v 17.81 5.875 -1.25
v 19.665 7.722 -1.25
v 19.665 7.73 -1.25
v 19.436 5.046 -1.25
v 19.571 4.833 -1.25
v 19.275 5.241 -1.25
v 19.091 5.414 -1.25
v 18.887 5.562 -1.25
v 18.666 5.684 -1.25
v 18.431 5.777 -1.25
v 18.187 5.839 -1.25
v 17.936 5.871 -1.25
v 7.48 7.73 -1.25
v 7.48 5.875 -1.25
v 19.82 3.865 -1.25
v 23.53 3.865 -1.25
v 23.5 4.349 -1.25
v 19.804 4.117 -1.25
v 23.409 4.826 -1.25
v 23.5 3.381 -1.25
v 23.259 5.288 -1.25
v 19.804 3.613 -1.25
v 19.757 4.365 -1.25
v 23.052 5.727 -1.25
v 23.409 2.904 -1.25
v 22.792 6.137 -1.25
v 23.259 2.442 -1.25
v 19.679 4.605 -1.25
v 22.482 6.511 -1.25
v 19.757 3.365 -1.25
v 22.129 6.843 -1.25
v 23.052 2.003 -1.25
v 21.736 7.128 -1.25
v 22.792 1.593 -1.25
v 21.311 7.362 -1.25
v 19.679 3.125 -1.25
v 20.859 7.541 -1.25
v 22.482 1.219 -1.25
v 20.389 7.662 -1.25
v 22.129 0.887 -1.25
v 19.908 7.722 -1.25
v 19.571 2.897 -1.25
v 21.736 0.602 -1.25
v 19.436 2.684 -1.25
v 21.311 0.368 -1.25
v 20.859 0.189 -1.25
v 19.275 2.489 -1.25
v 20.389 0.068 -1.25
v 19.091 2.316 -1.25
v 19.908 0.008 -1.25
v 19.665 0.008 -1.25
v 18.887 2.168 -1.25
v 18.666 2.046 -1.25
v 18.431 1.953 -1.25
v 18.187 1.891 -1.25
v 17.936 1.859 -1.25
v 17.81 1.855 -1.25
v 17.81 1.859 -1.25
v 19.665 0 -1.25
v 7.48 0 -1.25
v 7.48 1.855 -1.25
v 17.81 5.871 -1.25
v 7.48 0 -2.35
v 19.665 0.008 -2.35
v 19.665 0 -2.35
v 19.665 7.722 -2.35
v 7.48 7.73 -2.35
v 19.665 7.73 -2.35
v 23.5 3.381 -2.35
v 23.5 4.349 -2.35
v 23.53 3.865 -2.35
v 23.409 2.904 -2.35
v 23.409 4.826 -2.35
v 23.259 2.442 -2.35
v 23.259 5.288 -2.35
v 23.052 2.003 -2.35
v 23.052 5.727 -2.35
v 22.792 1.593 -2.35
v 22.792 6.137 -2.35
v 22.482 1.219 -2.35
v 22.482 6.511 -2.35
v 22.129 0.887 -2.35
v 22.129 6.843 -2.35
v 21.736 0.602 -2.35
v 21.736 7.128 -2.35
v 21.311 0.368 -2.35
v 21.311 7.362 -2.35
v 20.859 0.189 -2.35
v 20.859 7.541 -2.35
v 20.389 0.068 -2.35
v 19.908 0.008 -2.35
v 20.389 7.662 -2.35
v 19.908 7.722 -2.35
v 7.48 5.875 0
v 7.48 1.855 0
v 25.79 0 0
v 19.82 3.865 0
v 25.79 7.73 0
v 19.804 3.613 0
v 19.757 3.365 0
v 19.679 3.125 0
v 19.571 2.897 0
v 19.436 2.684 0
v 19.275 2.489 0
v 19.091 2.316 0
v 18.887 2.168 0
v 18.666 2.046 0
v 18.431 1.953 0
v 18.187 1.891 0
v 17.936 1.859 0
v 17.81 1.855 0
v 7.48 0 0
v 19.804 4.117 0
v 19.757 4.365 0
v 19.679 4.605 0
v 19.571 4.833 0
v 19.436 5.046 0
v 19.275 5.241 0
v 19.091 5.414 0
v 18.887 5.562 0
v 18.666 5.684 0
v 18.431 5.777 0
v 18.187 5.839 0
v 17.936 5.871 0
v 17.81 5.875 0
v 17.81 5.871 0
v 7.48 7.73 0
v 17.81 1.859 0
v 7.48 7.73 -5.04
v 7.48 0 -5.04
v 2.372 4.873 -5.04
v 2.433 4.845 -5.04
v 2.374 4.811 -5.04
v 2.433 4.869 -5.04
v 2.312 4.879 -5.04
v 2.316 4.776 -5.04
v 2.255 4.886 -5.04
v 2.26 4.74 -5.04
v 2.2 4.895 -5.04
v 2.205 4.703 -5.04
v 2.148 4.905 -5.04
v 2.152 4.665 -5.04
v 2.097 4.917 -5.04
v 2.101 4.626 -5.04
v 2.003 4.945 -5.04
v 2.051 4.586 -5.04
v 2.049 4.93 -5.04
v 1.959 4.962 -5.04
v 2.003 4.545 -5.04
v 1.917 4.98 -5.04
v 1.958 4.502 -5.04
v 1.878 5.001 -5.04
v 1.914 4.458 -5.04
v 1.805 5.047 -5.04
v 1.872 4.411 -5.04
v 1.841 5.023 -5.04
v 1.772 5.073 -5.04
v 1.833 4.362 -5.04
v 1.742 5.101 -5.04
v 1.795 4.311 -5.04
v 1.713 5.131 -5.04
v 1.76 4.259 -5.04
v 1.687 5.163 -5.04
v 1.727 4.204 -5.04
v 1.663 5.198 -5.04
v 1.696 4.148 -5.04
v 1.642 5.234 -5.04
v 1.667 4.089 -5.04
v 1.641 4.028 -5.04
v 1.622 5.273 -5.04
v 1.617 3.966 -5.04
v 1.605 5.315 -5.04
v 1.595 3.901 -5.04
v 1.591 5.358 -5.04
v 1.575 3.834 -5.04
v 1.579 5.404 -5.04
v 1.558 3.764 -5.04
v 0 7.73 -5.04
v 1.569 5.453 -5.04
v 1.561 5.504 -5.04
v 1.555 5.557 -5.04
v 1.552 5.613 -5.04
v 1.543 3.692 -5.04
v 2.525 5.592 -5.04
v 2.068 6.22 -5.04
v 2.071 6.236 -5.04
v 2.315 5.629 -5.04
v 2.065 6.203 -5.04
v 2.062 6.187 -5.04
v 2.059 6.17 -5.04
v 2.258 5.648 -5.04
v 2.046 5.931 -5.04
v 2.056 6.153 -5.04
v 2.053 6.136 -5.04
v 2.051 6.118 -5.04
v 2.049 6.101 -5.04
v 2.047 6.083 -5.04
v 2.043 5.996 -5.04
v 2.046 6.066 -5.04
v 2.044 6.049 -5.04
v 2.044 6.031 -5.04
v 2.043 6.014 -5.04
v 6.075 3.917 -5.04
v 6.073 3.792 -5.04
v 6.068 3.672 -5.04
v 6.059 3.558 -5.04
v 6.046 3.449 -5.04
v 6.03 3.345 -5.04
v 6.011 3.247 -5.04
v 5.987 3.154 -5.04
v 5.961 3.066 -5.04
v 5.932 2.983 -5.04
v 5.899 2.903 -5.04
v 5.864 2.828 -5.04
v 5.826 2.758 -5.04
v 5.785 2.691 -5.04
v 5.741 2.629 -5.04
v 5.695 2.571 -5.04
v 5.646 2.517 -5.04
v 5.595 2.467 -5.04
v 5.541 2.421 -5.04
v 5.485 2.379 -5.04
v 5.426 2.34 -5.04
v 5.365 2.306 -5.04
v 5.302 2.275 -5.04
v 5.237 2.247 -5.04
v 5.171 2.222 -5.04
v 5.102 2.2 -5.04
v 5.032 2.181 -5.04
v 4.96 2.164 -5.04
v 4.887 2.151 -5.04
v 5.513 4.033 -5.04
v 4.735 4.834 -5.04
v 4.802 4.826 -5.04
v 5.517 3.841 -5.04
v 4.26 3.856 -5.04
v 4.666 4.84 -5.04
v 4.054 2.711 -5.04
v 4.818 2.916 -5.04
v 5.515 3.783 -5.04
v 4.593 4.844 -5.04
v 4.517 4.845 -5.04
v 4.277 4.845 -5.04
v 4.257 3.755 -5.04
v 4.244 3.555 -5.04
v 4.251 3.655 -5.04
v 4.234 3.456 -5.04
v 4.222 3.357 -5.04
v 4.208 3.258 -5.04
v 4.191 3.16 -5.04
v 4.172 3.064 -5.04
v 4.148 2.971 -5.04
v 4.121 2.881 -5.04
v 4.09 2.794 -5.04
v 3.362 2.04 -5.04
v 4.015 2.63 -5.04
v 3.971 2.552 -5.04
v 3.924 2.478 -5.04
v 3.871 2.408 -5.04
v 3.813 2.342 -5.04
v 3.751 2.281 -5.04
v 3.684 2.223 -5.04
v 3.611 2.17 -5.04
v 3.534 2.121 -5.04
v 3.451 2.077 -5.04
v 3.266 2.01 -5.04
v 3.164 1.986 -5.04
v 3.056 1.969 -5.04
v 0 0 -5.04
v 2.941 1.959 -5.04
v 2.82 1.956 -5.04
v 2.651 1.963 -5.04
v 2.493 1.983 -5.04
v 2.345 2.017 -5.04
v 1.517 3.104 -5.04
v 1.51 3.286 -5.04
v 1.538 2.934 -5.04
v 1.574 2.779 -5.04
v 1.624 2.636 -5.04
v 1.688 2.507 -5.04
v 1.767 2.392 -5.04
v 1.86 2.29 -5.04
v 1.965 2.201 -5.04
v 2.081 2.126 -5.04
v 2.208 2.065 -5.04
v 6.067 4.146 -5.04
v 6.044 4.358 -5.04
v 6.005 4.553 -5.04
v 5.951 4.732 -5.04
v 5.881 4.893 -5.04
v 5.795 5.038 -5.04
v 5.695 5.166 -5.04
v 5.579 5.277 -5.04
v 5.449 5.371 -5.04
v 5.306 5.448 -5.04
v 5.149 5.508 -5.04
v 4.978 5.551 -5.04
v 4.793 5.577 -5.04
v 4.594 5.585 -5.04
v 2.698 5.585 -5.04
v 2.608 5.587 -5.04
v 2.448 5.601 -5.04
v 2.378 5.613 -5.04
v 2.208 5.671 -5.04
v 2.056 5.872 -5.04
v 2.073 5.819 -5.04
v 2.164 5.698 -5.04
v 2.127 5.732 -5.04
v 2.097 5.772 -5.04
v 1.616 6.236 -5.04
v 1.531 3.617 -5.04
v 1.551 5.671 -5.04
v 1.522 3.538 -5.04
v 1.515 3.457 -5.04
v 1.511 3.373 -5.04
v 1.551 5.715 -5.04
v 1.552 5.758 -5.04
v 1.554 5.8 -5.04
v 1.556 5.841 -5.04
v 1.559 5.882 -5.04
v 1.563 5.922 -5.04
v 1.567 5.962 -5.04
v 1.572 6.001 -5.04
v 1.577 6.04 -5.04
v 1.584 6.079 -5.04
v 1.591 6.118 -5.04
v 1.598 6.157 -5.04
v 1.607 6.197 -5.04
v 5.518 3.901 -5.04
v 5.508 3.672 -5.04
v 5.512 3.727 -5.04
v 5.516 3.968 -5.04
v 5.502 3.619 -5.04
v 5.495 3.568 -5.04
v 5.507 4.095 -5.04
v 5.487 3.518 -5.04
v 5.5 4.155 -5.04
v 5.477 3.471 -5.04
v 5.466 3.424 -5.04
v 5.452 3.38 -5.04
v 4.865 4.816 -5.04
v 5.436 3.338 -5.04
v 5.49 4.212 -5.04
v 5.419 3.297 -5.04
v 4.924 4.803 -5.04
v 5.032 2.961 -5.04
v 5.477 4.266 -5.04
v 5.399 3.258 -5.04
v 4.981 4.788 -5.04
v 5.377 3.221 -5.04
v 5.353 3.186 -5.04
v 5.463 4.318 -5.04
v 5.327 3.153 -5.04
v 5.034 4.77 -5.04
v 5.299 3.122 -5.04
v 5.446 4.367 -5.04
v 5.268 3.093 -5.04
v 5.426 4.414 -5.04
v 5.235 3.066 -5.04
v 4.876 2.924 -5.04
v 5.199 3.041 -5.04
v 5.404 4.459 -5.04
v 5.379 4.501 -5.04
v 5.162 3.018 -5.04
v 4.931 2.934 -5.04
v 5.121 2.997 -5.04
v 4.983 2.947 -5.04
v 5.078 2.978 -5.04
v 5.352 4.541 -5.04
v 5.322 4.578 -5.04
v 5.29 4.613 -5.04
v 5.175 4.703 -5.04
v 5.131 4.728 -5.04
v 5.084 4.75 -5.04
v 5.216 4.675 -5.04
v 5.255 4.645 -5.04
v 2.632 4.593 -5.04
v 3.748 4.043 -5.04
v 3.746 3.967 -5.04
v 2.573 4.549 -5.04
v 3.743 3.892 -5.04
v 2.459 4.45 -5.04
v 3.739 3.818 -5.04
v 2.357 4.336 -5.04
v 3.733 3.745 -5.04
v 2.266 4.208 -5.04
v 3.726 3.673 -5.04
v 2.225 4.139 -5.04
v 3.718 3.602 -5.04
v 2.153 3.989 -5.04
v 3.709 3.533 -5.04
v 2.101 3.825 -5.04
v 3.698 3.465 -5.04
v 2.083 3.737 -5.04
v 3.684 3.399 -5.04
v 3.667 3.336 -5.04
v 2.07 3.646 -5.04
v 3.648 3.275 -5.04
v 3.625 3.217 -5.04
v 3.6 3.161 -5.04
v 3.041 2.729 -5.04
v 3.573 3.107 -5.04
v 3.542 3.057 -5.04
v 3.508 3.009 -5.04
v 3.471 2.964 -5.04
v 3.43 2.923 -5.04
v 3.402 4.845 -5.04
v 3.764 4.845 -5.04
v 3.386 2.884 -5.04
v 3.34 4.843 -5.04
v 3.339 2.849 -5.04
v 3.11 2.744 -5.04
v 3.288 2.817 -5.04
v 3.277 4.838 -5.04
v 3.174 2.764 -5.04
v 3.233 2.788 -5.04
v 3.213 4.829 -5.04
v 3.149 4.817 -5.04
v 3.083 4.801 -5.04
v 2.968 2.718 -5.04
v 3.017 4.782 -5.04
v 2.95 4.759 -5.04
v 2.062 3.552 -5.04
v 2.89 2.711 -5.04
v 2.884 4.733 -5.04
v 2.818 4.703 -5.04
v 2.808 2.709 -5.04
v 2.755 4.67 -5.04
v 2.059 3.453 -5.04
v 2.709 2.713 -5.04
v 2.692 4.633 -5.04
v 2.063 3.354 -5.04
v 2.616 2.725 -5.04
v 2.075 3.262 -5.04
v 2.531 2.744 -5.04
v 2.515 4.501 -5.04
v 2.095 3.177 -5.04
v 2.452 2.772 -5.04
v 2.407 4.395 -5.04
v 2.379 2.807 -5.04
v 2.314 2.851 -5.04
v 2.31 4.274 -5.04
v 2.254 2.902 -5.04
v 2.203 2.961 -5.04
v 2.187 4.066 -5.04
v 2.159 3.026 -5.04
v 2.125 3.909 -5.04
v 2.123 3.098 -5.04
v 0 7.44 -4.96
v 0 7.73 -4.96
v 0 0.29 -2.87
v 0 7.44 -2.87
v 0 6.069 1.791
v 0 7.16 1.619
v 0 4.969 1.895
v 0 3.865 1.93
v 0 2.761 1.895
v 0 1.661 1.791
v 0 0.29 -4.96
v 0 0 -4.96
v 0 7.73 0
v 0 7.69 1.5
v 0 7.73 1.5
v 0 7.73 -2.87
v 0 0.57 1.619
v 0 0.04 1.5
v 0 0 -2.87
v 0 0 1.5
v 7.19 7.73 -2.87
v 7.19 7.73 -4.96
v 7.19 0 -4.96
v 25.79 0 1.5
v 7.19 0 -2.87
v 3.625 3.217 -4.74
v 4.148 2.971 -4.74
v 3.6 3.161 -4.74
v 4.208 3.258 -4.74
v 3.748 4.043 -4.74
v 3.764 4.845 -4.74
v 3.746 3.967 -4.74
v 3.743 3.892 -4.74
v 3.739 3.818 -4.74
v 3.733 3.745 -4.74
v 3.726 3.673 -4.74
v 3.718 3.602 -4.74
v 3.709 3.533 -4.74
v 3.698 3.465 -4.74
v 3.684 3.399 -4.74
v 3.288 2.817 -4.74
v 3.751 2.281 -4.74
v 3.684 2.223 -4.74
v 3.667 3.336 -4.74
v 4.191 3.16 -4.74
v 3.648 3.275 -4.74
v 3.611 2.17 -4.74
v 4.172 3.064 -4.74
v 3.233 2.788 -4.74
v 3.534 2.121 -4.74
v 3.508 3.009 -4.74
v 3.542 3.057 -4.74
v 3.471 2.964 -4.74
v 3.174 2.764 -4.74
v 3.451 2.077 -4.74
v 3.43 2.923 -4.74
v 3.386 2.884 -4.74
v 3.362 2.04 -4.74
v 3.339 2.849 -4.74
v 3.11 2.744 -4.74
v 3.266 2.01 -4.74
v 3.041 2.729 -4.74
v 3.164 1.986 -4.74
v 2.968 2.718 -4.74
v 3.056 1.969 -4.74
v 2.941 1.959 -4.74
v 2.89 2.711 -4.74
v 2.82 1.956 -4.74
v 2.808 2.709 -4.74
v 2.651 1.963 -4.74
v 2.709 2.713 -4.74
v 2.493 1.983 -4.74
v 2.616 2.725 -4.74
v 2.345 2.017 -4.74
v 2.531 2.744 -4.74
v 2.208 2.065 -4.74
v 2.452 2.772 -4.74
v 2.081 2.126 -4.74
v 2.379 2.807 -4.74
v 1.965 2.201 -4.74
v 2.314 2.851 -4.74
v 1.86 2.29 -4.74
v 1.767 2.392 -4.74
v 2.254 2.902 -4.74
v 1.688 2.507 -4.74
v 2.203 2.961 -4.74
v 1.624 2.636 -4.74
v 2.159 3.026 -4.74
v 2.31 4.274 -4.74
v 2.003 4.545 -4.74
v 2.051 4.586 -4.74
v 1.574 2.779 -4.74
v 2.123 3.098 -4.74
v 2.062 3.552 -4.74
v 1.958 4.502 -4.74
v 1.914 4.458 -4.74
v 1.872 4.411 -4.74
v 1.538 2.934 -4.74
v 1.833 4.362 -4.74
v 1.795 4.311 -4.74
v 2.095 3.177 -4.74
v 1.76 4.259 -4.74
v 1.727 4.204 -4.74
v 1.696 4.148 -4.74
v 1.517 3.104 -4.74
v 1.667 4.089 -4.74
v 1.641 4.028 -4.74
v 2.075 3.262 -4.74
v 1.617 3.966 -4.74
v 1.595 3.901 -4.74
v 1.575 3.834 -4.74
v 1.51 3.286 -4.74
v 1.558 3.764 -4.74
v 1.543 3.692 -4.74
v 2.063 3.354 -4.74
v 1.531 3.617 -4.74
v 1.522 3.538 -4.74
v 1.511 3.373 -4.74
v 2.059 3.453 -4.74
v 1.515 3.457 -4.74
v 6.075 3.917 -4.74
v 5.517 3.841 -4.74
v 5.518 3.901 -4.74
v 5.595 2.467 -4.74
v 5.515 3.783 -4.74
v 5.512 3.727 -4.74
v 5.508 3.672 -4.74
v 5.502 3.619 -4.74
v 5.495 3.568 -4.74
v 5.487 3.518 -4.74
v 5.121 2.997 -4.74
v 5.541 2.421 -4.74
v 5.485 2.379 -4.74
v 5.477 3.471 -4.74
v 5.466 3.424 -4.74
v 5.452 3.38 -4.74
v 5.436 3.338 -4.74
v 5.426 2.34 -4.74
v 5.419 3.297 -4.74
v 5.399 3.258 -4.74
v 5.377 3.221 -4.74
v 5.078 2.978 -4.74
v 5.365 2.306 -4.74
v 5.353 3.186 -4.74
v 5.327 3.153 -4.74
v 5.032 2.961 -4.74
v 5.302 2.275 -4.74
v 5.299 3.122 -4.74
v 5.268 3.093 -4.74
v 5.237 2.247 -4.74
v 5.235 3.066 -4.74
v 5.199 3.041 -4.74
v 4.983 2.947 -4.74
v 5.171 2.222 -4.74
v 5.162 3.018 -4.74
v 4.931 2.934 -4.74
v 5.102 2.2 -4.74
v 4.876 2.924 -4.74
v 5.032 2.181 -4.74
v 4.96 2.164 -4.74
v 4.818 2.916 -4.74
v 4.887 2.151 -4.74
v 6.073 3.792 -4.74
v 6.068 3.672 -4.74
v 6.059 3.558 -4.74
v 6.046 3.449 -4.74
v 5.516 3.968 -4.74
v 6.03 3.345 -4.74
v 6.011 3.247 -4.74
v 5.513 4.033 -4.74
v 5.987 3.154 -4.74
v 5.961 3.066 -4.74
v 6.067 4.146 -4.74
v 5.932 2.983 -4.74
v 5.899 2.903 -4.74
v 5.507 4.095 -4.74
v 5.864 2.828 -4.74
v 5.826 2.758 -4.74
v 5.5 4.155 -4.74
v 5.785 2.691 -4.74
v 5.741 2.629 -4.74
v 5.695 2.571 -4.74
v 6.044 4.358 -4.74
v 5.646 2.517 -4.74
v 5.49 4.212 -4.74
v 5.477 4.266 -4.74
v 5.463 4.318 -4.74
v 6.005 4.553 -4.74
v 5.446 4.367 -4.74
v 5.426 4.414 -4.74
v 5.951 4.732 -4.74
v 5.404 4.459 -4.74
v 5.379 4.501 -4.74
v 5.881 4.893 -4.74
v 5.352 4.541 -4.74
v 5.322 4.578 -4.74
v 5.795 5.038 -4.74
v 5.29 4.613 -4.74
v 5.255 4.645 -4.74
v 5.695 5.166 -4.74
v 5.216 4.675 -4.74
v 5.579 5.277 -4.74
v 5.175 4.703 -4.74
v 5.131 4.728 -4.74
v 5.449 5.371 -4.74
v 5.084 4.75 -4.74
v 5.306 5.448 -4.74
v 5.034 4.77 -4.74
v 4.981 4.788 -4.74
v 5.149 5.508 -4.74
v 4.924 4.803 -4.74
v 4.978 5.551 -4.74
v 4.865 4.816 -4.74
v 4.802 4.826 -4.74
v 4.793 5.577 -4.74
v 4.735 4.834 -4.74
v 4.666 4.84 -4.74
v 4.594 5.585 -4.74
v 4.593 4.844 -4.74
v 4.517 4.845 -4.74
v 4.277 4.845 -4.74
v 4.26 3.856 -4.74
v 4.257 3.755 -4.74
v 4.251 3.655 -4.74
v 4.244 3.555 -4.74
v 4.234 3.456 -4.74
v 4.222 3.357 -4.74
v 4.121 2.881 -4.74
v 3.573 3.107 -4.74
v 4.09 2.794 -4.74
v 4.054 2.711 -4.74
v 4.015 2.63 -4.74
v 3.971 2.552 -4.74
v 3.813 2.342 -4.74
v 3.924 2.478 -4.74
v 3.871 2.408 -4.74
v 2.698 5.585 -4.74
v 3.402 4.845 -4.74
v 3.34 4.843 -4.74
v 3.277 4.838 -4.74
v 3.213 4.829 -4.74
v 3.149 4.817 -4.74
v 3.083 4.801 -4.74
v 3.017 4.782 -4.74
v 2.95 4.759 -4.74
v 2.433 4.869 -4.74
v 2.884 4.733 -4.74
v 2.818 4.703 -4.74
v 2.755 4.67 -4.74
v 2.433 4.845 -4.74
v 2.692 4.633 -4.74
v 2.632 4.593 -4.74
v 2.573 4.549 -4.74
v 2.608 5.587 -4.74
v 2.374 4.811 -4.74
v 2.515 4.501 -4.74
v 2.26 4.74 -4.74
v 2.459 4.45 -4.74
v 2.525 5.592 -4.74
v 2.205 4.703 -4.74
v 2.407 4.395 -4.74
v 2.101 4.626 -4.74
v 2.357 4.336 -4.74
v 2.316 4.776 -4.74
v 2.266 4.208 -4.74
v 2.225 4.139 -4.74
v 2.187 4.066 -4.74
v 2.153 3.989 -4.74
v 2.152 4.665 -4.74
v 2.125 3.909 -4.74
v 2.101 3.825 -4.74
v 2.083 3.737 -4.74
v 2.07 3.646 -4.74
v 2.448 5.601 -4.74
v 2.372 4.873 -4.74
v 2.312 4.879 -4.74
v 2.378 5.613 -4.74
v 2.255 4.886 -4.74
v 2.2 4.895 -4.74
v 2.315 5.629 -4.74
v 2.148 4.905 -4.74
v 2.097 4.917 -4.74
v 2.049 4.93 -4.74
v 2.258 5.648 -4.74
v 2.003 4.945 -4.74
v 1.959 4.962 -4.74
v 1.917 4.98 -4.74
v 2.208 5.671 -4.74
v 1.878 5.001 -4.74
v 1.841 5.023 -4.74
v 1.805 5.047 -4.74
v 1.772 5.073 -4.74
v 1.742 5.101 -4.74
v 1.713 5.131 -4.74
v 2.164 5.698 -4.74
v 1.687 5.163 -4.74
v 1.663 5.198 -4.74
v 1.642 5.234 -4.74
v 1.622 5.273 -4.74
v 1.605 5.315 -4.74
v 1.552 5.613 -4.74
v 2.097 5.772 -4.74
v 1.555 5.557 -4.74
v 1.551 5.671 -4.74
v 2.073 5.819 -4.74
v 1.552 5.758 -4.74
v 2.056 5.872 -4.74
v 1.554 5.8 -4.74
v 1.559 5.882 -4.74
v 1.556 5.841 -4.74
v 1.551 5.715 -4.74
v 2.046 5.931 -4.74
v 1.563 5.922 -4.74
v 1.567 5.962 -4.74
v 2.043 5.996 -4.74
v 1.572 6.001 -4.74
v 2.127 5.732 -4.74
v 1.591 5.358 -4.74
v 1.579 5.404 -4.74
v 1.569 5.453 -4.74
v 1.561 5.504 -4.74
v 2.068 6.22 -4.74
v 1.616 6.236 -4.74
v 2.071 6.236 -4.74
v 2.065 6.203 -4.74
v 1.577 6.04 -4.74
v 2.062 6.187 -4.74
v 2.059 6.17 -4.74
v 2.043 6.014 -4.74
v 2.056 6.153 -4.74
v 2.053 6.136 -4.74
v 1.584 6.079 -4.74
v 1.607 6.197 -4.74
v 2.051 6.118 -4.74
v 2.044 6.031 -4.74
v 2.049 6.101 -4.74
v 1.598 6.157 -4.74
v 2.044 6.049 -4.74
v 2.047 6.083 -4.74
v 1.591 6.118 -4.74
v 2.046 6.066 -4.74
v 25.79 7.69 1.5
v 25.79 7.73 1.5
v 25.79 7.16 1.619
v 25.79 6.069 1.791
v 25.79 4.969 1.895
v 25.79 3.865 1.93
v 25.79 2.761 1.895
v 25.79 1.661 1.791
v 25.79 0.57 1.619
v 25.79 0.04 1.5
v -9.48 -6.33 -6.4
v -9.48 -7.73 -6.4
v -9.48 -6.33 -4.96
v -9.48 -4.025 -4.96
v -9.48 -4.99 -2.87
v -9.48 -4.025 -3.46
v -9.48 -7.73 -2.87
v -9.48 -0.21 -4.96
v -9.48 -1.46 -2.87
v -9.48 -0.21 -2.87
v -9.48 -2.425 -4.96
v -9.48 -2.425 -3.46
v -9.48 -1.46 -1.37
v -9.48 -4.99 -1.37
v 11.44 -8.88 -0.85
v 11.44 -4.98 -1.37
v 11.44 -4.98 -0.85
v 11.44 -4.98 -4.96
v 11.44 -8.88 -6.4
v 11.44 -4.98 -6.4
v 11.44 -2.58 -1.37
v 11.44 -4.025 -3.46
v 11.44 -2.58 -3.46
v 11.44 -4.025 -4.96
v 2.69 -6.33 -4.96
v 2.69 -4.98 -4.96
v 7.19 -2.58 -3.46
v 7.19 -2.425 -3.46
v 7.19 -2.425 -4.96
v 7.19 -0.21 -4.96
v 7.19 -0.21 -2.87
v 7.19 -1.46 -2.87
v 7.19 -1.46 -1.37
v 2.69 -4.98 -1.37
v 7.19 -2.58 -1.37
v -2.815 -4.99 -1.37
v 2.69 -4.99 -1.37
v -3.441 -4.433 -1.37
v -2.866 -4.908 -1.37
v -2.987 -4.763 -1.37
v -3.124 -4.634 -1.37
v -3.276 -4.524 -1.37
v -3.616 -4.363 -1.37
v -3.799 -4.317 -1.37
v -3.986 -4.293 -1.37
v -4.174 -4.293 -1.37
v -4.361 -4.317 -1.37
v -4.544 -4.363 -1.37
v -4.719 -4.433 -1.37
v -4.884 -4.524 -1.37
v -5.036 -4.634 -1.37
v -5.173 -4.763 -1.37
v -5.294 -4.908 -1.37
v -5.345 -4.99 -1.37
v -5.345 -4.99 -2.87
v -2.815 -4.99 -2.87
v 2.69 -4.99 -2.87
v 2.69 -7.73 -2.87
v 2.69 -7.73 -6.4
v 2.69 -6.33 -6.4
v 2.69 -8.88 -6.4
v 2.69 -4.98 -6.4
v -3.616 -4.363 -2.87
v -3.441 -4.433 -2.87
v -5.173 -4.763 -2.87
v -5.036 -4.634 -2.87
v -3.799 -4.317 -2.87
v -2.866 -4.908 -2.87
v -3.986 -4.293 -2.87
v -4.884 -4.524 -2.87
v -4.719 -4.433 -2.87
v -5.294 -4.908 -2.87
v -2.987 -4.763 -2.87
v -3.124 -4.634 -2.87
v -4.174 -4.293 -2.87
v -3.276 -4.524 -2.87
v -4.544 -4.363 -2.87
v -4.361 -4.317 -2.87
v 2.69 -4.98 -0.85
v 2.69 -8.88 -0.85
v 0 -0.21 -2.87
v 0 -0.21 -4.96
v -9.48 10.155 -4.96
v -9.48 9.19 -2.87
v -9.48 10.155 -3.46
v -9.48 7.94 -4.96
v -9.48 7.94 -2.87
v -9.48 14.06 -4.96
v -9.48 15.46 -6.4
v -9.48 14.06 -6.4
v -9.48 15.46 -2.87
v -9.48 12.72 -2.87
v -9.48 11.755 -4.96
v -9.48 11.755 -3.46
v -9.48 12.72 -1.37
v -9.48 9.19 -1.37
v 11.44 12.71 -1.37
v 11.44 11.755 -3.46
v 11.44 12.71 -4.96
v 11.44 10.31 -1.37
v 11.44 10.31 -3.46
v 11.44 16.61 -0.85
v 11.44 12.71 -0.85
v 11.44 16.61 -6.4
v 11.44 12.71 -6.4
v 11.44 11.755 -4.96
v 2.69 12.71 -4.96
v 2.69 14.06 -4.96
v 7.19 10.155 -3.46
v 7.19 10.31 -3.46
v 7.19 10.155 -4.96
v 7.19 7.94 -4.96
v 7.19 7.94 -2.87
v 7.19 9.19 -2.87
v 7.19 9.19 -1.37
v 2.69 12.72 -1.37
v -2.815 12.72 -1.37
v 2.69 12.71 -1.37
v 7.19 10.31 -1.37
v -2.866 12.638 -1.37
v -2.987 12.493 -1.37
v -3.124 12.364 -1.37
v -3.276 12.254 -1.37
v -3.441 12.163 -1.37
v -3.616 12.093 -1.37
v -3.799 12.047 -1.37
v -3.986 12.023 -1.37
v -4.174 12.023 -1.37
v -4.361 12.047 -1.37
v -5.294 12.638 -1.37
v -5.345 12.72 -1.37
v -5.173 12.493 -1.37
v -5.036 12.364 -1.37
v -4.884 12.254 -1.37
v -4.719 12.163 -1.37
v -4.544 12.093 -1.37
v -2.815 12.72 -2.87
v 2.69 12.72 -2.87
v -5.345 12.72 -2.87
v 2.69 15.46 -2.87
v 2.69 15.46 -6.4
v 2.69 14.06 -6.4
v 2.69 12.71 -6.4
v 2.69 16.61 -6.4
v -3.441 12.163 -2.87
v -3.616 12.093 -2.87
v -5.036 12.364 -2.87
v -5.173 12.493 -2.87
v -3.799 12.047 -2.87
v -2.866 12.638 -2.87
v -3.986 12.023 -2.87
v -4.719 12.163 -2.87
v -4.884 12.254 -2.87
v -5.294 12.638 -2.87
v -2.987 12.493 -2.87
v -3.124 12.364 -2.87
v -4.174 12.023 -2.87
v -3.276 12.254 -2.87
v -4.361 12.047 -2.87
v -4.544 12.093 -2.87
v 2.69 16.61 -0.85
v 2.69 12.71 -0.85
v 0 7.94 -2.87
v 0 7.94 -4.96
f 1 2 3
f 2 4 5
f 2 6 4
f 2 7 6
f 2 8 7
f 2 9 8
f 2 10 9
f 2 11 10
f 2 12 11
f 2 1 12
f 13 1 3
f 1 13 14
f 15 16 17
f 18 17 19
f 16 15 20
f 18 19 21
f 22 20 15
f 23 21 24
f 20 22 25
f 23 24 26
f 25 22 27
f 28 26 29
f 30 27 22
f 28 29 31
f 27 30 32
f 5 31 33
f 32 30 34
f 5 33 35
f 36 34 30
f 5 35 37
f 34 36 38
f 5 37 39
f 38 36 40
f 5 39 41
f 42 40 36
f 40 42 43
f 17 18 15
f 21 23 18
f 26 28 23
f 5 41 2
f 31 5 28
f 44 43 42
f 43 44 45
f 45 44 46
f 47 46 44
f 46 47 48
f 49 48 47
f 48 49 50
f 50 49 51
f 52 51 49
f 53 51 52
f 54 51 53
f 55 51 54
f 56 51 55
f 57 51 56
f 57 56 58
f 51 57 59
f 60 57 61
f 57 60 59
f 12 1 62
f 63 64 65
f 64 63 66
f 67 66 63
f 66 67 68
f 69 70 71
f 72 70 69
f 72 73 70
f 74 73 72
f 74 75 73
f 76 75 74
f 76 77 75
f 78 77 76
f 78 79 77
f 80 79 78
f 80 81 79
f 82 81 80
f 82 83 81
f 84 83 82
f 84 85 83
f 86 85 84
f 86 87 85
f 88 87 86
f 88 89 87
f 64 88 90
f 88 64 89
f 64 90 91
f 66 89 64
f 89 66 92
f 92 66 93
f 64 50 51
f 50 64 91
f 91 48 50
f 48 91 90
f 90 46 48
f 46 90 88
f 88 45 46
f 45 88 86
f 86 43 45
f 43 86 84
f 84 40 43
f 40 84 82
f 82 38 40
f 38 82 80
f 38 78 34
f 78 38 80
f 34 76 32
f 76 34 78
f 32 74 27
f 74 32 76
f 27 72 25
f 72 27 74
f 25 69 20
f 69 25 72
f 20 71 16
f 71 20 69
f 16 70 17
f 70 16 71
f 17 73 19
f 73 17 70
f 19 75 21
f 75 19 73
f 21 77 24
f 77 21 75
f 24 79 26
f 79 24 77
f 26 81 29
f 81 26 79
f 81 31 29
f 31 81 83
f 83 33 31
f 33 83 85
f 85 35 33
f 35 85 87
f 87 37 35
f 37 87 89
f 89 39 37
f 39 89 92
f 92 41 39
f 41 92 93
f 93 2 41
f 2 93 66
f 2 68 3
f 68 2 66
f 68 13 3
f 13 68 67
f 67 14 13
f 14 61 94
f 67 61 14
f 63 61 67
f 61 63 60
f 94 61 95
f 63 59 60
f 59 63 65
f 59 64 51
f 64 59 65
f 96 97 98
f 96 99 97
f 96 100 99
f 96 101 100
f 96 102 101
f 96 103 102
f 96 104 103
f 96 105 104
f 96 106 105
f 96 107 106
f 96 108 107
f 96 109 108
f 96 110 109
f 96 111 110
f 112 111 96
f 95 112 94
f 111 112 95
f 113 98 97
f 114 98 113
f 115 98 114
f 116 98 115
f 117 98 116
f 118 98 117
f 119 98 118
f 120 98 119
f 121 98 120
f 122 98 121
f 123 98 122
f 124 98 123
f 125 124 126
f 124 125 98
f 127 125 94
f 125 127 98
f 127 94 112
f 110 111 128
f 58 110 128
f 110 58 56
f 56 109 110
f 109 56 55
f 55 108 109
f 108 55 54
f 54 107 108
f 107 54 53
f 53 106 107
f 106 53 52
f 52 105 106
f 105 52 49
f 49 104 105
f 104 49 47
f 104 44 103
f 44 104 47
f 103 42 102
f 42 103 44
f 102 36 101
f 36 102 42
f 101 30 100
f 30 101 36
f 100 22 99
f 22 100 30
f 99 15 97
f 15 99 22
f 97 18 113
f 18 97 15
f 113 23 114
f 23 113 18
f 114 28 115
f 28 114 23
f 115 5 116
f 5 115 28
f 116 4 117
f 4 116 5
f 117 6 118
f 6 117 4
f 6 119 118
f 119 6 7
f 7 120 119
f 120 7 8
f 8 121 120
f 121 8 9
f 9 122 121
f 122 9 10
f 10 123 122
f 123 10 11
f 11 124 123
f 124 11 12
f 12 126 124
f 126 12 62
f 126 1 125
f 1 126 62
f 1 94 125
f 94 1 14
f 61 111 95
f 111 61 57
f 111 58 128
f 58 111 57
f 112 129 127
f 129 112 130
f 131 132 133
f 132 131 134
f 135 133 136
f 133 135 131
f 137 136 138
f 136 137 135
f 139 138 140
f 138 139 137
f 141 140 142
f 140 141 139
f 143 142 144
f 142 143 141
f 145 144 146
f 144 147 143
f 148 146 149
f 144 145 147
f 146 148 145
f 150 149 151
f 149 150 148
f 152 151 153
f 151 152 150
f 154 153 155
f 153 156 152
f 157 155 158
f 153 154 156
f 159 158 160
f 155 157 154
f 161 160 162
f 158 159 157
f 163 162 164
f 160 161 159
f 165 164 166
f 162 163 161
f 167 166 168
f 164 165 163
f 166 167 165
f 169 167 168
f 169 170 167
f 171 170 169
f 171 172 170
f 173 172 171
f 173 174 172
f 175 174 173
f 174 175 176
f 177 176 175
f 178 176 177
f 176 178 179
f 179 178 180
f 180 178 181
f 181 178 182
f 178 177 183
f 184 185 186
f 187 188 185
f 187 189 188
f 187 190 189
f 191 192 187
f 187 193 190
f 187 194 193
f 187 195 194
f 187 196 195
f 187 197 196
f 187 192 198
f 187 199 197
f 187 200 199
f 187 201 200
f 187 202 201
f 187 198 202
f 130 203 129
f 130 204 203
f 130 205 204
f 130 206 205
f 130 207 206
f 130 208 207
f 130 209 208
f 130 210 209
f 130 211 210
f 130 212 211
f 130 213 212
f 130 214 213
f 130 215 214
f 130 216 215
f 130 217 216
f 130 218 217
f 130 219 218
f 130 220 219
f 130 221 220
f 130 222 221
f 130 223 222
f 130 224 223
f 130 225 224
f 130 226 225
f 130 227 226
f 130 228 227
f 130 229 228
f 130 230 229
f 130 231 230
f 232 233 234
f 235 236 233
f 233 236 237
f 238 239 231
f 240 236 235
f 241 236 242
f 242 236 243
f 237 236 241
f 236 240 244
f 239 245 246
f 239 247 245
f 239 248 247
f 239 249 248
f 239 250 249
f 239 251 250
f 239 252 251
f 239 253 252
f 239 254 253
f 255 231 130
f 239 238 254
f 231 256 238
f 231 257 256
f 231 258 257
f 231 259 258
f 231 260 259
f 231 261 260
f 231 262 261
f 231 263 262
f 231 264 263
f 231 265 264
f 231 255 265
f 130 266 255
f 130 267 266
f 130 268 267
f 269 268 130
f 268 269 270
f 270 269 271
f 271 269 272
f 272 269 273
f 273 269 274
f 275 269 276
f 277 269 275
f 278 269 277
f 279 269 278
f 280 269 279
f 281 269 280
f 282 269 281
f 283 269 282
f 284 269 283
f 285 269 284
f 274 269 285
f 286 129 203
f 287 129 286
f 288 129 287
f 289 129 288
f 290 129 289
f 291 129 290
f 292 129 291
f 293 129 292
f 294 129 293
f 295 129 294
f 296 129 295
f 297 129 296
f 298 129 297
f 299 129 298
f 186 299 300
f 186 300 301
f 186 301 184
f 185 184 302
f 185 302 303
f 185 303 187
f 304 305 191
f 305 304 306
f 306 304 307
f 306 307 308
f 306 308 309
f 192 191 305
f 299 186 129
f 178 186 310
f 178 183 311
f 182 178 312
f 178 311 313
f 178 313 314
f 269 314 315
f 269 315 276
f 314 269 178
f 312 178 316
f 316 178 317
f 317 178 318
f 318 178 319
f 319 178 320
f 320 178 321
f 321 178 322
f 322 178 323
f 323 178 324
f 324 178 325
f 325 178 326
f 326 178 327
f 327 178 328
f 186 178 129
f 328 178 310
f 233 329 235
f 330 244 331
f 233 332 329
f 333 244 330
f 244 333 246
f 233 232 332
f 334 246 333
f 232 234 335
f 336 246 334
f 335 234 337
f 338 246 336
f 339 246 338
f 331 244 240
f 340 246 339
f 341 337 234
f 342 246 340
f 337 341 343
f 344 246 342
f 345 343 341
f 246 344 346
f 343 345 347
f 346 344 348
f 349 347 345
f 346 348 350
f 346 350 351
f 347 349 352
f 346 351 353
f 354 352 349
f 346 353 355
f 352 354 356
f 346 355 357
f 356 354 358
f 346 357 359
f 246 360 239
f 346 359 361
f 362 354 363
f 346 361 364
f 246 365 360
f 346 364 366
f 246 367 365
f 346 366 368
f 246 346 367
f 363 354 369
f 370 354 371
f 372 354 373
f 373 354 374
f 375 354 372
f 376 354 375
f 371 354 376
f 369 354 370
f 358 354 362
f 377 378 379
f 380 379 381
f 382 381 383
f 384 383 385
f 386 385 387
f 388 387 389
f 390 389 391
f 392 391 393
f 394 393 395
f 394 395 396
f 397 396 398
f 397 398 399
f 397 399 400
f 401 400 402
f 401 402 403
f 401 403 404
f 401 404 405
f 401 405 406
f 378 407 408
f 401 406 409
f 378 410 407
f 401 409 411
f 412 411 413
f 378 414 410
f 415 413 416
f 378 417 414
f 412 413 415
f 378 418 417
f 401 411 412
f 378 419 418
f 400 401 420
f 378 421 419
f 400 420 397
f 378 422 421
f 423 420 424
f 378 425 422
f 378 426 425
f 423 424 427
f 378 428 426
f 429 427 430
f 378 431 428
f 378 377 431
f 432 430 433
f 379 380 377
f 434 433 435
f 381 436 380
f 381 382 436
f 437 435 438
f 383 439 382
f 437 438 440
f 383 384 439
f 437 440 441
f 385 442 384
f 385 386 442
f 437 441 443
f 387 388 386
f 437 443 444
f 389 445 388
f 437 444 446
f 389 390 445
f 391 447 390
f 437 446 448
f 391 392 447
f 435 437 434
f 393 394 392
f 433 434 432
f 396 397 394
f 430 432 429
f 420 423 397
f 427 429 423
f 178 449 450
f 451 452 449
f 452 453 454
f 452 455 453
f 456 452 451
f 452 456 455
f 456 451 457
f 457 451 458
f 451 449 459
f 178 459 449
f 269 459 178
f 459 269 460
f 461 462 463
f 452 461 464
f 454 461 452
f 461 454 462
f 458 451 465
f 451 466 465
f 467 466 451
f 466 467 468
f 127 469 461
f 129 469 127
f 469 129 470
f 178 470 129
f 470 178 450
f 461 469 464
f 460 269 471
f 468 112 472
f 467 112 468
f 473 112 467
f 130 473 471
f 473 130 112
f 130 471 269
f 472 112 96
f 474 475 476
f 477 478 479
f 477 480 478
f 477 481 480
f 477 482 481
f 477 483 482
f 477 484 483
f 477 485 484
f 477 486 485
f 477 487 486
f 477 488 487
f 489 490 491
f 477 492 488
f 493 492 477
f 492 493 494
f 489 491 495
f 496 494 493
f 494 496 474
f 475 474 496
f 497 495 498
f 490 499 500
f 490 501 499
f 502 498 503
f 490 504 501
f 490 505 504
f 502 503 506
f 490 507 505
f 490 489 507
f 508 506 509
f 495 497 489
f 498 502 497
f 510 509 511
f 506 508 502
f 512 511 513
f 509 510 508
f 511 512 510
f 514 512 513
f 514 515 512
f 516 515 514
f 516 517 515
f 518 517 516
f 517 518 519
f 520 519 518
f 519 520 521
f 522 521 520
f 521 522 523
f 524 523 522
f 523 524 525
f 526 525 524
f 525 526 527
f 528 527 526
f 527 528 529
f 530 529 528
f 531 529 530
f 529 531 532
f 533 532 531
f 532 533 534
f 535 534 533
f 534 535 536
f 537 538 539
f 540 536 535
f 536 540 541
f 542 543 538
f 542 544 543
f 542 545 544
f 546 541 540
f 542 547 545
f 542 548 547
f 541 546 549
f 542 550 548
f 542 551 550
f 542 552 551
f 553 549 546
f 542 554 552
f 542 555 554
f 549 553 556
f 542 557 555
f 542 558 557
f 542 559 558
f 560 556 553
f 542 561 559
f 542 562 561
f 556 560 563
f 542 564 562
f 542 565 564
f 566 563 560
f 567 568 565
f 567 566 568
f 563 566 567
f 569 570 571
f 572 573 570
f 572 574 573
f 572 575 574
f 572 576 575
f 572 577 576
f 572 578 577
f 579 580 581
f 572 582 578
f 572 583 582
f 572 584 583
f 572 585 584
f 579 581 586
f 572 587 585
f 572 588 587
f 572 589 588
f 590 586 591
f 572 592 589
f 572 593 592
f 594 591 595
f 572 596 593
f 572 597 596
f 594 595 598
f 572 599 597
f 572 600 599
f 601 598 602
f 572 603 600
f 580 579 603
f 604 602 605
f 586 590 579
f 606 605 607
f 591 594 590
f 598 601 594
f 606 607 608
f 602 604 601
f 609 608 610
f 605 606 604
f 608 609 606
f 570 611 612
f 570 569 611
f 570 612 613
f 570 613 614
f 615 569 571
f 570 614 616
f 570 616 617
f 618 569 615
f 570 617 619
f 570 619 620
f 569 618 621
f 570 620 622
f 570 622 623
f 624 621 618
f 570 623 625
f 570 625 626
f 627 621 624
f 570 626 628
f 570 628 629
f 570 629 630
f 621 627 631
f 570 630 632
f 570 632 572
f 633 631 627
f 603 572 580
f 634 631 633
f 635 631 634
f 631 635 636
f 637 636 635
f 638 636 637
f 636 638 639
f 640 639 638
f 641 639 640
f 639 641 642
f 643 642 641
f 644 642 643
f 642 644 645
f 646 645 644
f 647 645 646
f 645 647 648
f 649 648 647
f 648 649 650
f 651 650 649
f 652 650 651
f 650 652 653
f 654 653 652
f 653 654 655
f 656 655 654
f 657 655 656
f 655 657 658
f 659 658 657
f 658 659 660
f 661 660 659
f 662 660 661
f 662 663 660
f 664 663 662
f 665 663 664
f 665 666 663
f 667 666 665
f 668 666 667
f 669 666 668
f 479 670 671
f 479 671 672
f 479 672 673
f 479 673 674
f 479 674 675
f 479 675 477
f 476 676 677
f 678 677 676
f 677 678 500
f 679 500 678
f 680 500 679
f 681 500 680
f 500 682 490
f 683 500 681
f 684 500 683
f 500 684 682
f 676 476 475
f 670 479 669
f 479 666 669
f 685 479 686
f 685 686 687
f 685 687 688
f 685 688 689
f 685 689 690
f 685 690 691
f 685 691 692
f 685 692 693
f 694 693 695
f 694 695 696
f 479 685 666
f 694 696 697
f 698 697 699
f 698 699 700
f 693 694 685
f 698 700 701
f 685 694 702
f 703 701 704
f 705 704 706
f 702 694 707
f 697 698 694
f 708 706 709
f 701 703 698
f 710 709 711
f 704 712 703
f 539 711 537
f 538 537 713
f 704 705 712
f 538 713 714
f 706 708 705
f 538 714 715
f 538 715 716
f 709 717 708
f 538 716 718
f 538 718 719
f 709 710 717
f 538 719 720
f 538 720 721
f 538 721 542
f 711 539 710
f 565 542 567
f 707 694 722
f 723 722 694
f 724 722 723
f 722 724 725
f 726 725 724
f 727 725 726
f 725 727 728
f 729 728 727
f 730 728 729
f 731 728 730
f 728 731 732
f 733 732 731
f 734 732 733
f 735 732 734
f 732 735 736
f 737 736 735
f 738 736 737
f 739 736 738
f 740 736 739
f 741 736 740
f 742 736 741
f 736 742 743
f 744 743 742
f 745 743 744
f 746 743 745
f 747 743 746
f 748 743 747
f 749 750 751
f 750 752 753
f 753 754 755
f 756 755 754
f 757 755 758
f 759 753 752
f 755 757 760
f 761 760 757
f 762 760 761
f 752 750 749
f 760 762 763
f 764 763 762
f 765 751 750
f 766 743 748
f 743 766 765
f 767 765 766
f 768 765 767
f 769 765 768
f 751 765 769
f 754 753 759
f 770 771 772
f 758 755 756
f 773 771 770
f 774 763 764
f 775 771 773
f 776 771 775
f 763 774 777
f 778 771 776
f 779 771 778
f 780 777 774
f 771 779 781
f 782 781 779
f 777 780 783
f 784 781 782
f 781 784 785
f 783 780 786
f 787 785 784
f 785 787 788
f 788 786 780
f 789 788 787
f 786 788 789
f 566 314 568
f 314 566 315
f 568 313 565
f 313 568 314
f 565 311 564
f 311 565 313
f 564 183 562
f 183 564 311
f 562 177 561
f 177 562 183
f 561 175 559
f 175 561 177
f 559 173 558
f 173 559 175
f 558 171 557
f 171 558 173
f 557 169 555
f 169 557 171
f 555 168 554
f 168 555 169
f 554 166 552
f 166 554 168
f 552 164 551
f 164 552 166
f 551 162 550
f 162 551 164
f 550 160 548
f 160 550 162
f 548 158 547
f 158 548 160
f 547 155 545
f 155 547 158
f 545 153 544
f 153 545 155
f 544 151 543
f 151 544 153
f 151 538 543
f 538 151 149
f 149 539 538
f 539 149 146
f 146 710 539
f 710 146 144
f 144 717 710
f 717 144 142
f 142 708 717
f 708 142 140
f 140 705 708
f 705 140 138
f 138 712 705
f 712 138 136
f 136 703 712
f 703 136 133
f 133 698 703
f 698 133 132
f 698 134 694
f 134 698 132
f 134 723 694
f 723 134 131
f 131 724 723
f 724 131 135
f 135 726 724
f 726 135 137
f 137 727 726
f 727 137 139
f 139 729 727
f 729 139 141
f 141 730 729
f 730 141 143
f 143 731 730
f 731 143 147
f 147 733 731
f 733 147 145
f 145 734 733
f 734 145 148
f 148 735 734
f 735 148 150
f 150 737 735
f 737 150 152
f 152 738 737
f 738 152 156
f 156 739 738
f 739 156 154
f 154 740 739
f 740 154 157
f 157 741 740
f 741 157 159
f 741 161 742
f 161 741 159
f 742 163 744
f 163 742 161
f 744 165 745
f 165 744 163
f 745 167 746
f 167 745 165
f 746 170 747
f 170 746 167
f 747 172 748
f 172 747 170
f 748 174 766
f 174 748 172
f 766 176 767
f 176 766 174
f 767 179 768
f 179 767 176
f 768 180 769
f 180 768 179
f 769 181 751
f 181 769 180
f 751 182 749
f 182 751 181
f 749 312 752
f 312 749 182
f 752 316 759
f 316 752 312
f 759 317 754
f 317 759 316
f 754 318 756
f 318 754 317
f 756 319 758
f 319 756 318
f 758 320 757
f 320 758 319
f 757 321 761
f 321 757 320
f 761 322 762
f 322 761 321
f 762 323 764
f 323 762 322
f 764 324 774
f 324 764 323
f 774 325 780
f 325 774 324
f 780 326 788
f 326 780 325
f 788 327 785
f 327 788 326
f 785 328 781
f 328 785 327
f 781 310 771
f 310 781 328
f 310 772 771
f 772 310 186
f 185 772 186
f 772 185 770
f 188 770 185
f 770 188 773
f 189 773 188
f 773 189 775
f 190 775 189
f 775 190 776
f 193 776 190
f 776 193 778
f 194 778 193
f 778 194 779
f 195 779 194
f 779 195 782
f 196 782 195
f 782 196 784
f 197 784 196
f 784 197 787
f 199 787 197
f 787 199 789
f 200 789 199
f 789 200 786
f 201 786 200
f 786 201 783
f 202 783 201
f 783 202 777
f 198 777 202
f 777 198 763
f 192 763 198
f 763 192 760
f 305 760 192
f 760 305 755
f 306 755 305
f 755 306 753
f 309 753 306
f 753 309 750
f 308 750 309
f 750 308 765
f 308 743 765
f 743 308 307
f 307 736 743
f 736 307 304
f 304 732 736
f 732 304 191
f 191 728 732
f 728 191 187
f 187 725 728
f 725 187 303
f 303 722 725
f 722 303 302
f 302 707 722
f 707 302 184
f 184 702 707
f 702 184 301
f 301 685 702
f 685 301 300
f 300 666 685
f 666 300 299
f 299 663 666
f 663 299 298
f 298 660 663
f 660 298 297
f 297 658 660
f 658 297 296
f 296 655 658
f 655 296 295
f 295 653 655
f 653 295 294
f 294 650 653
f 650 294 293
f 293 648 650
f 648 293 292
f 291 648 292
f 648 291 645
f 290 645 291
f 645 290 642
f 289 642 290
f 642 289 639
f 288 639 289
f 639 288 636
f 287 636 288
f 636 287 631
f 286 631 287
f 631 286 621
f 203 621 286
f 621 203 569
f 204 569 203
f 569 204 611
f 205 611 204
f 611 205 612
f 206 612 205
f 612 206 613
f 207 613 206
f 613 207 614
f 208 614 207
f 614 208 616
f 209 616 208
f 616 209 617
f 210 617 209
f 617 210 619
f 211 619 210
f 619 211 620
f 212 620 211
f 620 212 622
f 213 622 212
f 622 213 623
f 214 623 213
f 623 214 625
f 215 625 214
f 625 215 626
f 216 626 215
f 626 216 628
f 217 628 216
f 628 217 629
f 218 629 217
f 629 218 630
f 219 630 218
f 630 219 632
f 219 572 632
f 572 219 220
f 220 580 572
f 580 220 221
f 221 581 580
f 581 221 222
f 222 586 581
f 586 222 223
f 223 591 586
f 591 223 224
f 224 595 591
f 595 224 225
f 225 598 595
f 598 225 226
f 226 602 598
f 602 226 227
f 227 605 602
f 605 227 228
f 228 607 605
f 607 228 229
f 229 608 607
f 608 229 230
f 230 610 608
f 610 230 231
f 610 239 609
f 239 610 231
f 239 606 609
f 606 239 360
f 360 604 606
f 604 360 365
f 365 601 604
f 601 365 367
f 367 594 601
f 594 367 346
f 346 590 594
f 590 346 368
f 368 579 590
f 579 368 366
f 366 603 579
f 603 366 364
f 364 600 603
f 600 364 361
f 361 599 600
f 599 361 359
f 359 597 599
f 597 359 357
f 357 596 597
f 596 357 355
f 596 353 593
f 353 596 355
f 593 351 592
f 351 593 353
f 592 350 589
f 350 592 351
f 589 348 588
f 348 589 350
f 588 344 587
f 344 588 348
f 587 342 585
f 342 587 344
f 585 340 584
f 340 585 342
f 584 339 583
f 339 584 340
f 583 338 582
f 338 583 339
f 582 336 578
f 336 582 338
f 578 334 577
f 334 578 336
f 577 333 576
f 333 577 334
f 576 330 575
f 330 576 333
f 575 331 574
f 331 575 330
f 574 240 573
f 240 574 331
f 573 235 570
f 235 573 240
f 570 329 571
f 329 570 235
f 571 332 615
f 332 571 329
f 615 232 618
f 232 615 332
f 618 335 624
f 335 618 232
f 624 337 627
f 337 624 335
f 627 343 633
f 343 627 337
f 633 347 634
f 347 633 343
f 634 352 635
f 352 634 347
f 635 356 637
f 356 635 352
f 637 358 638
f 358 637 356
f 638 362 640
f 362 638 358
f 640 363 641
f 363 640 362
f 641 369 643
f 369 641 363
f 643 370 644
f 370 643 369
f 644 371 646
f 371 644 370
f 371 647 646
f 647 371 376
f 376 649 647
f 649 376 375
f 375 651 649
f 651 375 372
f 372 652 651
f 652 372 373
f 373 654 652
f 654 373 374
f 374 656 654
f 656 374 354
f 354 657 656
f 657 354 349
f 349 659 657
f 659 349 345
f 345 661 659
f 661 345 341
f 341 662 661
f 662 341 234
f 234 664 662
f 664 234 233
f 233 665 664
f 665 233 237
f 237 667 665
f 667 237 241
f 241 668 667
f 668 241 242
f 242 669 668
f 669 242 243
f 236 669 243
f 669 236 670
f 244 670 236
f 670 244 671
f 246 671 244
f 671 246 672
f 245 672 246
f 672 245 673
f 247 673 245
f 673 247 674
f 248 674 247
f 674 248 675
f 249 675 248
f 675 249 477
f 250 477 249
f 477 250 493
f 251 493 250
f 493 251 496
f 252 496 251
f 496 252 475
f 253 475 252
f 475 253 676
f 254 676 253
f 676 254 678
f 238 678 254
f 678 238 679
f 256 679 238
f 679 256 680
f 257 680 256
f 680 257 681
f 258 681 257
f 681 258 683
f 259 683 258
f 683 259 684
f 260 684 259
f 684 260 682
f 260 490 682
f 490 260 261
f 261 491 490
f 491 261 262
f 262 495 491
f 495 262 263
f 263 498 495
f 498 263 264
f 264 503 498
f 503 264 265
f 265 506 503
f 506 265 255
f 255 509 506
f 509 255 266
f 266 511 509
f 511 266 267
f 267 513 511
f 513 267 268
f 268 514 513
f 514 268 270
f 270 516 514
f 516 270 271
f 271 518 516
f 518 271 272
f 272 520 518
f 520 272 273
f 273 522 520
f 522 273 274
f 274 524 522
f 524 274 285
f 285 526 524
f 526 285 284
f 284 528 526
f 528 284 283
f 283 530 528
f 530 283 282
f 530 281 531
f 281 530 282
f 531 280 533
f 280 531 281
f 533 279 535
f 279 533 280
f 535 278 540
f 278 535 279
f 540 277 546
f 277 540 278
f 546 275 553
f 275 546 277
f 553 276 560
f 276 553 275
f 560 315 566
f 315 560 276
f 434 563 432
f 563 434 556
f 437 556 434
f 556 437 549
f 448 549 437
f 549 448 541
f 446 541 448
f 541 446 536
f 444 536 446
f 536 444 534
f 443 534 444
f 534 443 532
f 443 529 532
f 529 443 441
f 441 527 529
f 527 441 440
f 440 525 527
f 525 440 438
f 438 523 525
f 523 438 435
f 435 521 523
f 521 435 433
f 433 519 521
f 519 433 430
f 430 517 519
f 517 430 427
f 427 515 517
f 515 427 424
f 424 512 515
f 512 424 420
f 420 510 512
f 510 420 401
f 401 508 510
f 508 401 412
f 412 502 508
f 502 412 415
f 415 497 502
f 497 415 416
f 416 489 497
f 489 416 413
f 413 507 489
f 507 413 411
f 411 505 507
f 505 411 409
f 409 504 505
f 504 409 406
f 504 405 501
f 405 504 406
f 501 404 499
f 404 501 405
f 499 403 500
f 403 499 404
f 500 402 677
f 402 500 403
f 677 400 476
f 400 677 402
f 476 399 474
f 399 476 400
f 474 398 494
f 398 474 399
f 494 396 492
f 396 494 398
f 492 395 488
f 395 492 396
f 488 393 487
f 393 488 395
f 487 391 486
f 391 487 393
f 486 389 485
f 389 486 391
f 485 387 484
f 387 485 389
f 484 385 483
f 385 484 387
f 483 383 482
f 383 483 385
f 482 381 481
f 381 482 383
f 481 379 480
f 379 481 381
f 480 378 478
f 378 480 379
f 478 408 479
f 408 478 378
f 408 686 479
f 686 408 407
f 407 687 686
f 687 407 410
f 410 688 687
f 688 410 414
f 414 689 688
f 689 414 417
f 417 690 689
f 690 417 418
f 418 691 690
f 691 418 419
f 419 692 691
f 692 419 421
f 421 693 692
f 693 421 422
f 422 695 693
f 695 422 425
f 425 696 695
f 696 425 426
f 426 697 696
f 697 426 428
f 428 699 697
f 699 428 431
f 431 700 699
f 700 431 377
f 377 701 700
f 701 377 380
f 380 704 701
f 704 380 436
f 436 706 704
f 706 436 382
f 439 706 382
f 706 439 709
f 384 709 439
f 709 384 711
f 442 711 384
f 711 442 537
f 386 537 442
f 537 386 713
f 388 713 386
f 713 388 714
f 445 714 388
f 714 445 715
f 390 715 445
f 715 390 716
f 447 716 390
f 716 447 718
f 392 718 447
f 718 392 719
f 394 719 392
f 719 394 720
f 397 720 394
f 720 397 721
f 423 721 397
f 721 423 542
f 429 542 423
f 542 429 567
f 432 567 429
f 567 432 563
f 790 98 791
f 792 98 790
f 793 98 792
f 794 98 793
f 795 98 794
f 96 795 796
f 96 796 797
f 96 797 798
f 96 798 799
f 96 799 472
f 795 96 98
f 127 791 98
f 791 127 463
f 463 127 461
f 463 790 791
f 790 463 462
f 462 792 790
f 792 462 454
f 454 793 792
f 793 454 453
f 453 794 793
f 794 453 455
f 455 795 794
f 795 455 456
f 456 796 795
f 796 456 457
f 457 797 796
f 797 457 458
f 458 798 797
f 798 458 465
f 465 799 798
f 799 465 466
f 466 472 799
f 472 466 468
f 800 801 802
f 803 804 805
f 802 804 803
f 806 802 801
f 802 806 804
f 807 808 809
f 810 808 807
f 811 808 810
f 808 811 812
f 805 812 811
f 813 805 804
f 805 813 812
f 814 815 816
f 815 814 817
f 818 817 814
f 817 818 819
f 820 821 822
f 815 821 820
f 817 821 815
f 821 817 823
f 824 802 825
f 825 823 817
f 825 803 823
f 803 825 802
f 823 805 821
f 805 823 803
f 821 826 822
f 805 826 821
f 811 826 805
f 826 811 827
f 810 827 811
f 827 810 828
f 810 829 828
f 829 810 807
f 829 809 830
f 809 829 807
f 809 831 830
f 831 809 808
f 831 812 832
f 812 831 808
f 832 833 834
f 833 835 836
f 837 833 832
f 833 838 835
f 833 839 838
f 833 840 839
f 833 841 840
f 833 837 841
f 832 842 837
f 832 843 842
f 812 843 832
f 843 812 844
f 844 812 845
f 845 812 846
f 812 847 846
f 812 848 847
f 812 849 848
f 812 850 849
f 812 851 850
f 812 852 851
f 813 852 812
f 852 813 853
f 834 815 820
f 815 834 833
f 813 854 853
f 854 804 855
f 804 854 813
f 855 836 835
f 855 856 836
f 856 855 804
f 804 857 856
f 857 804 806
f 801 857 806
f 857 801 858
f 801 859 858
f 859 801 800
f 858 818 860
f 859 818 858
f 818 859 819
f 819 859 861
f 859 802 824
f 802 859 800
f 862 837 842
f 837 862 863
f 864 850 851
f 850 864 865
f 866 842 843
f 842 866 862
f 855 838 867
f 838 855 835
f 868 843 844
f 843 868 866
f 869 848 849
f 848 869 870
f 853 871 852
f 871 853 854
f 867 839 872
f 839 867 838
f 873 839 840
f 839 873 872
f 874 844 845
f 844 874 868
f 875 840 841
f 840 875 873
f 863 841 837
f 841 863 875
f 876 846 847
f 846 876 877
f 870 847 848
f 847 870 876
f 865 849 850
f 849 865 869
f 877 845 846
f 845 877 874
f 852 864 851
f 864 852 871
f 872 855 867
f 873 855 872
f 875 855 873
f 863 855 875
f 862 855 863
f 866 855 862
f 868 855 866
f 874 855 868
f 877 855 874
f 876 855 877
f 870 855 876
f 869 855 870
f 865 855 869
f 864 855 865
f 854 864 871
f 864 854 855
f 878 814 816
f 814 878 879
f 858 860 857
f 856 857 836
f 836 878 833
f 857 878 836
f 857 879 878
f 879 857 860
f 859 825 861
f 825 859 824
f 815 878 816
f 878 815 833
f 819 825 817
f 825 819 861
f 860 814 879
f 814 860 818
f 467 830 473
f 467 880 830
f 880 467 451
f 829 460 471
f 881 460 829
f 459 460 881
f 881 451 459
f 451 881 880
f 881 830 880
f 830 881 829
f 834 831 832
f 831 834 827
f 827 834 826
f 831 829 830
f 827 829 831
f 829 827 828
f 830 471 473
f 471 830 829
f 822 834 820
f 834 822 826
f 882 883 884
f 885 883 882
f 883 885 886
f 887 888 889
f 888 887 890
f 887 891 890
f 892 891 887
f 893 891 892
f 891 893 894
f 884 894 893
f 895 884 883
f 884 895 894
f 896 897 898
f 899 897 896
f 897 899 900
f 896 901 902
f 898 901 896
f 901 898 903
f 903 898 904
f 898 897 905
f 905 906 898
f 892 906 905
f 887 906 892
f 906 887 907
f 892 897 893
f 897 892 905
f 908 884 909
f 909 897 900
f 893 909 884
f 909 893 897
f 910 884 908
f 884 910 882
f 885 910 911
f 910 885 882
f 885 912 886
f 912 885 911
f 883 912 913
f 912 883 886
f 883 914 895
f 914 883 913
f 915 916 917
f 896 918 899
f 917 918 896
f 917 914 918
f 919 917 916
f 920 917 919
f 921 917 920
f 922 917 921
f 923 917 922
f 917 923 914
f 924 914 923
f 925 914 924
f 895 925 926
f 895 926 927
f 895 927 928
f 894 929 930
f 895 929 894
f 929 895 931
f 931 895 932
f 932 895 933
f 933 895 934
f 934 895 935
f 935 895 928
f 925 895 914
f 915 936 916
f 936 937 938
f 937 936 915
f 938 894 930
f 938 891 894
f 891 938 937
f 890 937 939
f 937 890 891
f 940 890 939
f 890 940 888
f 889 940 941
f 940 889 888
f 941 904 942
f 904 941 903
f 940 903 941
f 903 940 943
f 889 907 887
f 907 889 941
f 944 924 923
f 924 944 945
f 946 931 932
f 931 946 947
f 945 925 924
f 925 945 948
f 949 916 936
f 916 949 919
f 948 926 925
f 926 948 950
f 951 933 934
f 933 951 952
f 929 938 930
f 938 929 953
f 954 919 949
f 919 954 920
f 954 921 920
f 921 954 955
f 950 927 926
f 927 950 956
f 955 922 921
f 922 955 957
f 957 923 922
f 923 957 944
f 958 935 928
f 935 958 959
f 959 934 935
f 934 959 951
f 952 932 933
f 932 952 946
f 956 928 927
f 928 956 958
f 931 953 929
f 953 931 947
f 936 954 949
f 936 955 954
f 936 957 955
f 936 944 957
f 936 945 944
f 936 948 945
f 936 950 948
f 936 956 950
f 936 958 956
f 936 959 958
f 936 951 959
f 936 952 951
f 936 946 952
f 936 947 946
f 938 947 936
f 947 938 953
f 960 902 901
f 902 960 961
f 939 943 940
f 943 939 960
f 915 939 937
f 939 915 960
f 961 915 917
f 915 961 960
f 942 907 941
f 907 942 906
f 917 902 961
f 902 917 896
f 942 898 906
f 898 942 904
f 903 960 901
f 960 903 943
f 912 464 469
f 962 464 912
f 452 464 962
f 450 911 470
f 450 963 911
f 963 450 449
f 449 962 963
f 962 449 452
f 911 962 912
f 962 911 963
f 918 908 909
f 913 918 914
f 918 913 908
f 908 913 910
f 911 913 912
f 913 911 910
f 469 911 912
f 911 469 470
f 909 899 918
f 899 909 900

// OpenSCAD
/*
Control panel bracket for Miele PUR 88 W range hood
https://www.mieleusa.com/e/30-inch-wall-mounted-ventilation-hood-pur-88-w-stainless-steel-10743170-p

May work with other models, but I haven't tested them.

These clips go at either end of the buttons to hold them in the panel.
They have broken repeatedly, so I put this together so I can replace
them as needed rather than trying to get spares from Miele.

All units in mm.

Jeremy Fitzhardinge <jeremy@goop.org> 2022
*/

// Version id imprinted in output - 1 char
version = "a";

cap_len = 25.79;
cap_width = 7.73;
cap_face_middle = 1.93;
cap_face_edge = 1.5;

base_plinth_len = 7.48;
base_plinth_thick = 5.04;

wing_len = 20.92;
wing_extend = 9.48;
wing_below = 1.36+base_plinth_thick;

$fn = 50;

function circle_by_three_points(A, B, C) =
let (
  yD_b = C.y - B.y,  xD_b = C.x - B.x,  yD_a = B.y - A.y,
  xD_a = B.x - A.x,  aS = yD_a / xD_a,  bS = yD_b / xD_b,
  cex = (aS * bS * (A.y - C.y) + 
  bS * (A.x + B.x) -    aS * (B.x + C.x)) / (2 * (bS - aS)),
  cey = -1 * (cex - (A.x + B.x) / 2) / aS + (A.y + B.y) / 2
)
[cex, cey];

function len3(v) = sqrt(pow(v.x, 2) + pow(v.y, 2));

module chord(width, height) {
a = [0,0];
    b = [width/2,height];
    c = [width,height];
    
    center = circle_by_three_points([0,0],[width/2, height], [width,0]);
    radius = len3([width,0] - center);
    
    intersection() {
        square([width,height]);
        translate(center) circle(radius, $fn=100);
    }
}

// Front-facing outer body
module cap() {
    /*
    
        cap_len
     +---------------+
     |               | cap_width
     +---------------+
    
    cap_face_middle
     /-\ (curve)
    |   | cap_face_edge
    */
    
    center = circle_by_three_points(
        [0, cap_face_edge],
        [cap_width/2, cap_face_middle],
        [cap_width, cap_face_edge]
    );
    radius = len3([cap_width,cap_face_edge]-center);
    
    rotate([90,0,90])
    linear_extrude(height = cap_len)
        union () {
            translate([0,cap_face_edge])
                chord(cap_width, cap_face_middle - cap_face_edge);
            square([cap_width,cap_face_edge]);
        }
}

module tongue(width, length) {
    union() {
        translate([0, -width/2])
            square([length - width/2, width]);
        translate([length - width/2, 0])
            circle(d = width);
    }
}

module cap_flange() {
    /*
    flange_len
    ---------\
             |
    ---------/
    
    ---------.  | flange_lip
           |    | flange_thick
    -------------. cap
                 |
    
    */
    flange_len = cap_len - 2.26 - base_plinth_len;
    flange_thick = 1.25;
    flange_lip = 2.35 - flange_thick;
    flange_under = 4.02; // width of narrow under

    translate([0,cap_width/2])
    scale([1,1,-1]) // look from below
    translate([base_plinth_len, 0, 0])
    union () {
        translate([0,0,flange_thick])
            linear_extrude(height = flange_lip)
                tongue(cap_width, flange_len);
        linear_extrude(height = flange_thick)
            tongue(flange_under, flange_len - (cap_width - flange_under));
    } 
}

module version () {
    ver_depth = .3;

    scale([-1,1,1])
    translate([0,0,-ver_depth])
    linear_extrude(height = ver_depth*2)
    rotate([0,0,90])
    text(text = version, size = 6, halign = "center", valign = "center");
}

module base_plinth() {
    
    scale([1,1,-1])
    difference () {
        cube([base_plinth_len, cap_width, base_plinth_thick]);
        translate([base_plinth_len / 2, cap_width / 2, base_plinth_thick])
            version();
    }
}

/*    
    End profile:
         x1          x2  
  y2     +-----------+
         |  +--w--+  |  y4
         |  | chan|  |    x3
  y1+----+  h nel |  +----+
    |       |     |       |
    |     +-+     +-------+y3
    |     | x5    x4
  y0+-----+
    x0    x6
*/
channelw = 1.6;
channelh = 1.50;

wx0 = 0;
wx1 = wx0 + 2.74;
wx2 = wx1 + 3.53;
wx3 = wx2 + 1.25;


ch_wall = ((wx2 - wx1) - channelw) / 2;

wx4 = wx2 - ch_wall;
wx5 = wx1 + ch_wall;

wx6 = wx0 + 1.40;

wy0 = 0 ;
wy1 = wy0 + 3.53;
wy2 = wy1 + 1.50;
wy3 = wy1 - 2.09;
wy4 = wy3 + channelh;

module wing_body() {

    difference() {
        rotate([90,0,90])
            linear_extrude(height = wing_len)
                polygon([
                    [wx0, wy0], [wx0, wy1], [wx1, wy1], [wx1, wy2], [wx2, wy2], [wx2, wy1], [wx3, wy1],
                    [wx3, wy3], [wx4, wy3], [wx4, wy4], [wx5, wy4], [wx5, wy3], [wx6, wy3], [wx6, wy0]
                ]);
        translate([(6.8+4)/2,wx1-.8,wy1])
            cylinder(d = 3, h = 5);
    }
}

lump_len = 8.75;

module wing_lump() {
    lump_len = 8.75;
    lump_height = 5.55;
    lump_width = 3.9;
    lump_out = 1.15;
    
    translate([wing_len - lump_len, -lump_out, 0])
    cube([lump_len, lump_width, lump_height]);
}

module wing_bridge() {
    translate([wing_extend, wx3, wy3])
        cube([lump_len, .5, abs(wy1-wy3)]);
}

module wing() {
    difference () {
        union () {
            wing_body();
            wing_lump();
            wing_bridge();
        }
        translate([wing_len-4.25, 5.15, 0])
        cube([5, 4.23, 10]);
    }    
}

module middle() {
    union () {
        cap();
        cap_flange();
        base_plinth();
    }
}


union() {
    middle();
    translate([-wing_extend,-cap_width,-wing_below])
        wing();
    translate([-wing_extend, cap_width*2, -wing_below])
        scale([1,-1,1])
            wing();
}
